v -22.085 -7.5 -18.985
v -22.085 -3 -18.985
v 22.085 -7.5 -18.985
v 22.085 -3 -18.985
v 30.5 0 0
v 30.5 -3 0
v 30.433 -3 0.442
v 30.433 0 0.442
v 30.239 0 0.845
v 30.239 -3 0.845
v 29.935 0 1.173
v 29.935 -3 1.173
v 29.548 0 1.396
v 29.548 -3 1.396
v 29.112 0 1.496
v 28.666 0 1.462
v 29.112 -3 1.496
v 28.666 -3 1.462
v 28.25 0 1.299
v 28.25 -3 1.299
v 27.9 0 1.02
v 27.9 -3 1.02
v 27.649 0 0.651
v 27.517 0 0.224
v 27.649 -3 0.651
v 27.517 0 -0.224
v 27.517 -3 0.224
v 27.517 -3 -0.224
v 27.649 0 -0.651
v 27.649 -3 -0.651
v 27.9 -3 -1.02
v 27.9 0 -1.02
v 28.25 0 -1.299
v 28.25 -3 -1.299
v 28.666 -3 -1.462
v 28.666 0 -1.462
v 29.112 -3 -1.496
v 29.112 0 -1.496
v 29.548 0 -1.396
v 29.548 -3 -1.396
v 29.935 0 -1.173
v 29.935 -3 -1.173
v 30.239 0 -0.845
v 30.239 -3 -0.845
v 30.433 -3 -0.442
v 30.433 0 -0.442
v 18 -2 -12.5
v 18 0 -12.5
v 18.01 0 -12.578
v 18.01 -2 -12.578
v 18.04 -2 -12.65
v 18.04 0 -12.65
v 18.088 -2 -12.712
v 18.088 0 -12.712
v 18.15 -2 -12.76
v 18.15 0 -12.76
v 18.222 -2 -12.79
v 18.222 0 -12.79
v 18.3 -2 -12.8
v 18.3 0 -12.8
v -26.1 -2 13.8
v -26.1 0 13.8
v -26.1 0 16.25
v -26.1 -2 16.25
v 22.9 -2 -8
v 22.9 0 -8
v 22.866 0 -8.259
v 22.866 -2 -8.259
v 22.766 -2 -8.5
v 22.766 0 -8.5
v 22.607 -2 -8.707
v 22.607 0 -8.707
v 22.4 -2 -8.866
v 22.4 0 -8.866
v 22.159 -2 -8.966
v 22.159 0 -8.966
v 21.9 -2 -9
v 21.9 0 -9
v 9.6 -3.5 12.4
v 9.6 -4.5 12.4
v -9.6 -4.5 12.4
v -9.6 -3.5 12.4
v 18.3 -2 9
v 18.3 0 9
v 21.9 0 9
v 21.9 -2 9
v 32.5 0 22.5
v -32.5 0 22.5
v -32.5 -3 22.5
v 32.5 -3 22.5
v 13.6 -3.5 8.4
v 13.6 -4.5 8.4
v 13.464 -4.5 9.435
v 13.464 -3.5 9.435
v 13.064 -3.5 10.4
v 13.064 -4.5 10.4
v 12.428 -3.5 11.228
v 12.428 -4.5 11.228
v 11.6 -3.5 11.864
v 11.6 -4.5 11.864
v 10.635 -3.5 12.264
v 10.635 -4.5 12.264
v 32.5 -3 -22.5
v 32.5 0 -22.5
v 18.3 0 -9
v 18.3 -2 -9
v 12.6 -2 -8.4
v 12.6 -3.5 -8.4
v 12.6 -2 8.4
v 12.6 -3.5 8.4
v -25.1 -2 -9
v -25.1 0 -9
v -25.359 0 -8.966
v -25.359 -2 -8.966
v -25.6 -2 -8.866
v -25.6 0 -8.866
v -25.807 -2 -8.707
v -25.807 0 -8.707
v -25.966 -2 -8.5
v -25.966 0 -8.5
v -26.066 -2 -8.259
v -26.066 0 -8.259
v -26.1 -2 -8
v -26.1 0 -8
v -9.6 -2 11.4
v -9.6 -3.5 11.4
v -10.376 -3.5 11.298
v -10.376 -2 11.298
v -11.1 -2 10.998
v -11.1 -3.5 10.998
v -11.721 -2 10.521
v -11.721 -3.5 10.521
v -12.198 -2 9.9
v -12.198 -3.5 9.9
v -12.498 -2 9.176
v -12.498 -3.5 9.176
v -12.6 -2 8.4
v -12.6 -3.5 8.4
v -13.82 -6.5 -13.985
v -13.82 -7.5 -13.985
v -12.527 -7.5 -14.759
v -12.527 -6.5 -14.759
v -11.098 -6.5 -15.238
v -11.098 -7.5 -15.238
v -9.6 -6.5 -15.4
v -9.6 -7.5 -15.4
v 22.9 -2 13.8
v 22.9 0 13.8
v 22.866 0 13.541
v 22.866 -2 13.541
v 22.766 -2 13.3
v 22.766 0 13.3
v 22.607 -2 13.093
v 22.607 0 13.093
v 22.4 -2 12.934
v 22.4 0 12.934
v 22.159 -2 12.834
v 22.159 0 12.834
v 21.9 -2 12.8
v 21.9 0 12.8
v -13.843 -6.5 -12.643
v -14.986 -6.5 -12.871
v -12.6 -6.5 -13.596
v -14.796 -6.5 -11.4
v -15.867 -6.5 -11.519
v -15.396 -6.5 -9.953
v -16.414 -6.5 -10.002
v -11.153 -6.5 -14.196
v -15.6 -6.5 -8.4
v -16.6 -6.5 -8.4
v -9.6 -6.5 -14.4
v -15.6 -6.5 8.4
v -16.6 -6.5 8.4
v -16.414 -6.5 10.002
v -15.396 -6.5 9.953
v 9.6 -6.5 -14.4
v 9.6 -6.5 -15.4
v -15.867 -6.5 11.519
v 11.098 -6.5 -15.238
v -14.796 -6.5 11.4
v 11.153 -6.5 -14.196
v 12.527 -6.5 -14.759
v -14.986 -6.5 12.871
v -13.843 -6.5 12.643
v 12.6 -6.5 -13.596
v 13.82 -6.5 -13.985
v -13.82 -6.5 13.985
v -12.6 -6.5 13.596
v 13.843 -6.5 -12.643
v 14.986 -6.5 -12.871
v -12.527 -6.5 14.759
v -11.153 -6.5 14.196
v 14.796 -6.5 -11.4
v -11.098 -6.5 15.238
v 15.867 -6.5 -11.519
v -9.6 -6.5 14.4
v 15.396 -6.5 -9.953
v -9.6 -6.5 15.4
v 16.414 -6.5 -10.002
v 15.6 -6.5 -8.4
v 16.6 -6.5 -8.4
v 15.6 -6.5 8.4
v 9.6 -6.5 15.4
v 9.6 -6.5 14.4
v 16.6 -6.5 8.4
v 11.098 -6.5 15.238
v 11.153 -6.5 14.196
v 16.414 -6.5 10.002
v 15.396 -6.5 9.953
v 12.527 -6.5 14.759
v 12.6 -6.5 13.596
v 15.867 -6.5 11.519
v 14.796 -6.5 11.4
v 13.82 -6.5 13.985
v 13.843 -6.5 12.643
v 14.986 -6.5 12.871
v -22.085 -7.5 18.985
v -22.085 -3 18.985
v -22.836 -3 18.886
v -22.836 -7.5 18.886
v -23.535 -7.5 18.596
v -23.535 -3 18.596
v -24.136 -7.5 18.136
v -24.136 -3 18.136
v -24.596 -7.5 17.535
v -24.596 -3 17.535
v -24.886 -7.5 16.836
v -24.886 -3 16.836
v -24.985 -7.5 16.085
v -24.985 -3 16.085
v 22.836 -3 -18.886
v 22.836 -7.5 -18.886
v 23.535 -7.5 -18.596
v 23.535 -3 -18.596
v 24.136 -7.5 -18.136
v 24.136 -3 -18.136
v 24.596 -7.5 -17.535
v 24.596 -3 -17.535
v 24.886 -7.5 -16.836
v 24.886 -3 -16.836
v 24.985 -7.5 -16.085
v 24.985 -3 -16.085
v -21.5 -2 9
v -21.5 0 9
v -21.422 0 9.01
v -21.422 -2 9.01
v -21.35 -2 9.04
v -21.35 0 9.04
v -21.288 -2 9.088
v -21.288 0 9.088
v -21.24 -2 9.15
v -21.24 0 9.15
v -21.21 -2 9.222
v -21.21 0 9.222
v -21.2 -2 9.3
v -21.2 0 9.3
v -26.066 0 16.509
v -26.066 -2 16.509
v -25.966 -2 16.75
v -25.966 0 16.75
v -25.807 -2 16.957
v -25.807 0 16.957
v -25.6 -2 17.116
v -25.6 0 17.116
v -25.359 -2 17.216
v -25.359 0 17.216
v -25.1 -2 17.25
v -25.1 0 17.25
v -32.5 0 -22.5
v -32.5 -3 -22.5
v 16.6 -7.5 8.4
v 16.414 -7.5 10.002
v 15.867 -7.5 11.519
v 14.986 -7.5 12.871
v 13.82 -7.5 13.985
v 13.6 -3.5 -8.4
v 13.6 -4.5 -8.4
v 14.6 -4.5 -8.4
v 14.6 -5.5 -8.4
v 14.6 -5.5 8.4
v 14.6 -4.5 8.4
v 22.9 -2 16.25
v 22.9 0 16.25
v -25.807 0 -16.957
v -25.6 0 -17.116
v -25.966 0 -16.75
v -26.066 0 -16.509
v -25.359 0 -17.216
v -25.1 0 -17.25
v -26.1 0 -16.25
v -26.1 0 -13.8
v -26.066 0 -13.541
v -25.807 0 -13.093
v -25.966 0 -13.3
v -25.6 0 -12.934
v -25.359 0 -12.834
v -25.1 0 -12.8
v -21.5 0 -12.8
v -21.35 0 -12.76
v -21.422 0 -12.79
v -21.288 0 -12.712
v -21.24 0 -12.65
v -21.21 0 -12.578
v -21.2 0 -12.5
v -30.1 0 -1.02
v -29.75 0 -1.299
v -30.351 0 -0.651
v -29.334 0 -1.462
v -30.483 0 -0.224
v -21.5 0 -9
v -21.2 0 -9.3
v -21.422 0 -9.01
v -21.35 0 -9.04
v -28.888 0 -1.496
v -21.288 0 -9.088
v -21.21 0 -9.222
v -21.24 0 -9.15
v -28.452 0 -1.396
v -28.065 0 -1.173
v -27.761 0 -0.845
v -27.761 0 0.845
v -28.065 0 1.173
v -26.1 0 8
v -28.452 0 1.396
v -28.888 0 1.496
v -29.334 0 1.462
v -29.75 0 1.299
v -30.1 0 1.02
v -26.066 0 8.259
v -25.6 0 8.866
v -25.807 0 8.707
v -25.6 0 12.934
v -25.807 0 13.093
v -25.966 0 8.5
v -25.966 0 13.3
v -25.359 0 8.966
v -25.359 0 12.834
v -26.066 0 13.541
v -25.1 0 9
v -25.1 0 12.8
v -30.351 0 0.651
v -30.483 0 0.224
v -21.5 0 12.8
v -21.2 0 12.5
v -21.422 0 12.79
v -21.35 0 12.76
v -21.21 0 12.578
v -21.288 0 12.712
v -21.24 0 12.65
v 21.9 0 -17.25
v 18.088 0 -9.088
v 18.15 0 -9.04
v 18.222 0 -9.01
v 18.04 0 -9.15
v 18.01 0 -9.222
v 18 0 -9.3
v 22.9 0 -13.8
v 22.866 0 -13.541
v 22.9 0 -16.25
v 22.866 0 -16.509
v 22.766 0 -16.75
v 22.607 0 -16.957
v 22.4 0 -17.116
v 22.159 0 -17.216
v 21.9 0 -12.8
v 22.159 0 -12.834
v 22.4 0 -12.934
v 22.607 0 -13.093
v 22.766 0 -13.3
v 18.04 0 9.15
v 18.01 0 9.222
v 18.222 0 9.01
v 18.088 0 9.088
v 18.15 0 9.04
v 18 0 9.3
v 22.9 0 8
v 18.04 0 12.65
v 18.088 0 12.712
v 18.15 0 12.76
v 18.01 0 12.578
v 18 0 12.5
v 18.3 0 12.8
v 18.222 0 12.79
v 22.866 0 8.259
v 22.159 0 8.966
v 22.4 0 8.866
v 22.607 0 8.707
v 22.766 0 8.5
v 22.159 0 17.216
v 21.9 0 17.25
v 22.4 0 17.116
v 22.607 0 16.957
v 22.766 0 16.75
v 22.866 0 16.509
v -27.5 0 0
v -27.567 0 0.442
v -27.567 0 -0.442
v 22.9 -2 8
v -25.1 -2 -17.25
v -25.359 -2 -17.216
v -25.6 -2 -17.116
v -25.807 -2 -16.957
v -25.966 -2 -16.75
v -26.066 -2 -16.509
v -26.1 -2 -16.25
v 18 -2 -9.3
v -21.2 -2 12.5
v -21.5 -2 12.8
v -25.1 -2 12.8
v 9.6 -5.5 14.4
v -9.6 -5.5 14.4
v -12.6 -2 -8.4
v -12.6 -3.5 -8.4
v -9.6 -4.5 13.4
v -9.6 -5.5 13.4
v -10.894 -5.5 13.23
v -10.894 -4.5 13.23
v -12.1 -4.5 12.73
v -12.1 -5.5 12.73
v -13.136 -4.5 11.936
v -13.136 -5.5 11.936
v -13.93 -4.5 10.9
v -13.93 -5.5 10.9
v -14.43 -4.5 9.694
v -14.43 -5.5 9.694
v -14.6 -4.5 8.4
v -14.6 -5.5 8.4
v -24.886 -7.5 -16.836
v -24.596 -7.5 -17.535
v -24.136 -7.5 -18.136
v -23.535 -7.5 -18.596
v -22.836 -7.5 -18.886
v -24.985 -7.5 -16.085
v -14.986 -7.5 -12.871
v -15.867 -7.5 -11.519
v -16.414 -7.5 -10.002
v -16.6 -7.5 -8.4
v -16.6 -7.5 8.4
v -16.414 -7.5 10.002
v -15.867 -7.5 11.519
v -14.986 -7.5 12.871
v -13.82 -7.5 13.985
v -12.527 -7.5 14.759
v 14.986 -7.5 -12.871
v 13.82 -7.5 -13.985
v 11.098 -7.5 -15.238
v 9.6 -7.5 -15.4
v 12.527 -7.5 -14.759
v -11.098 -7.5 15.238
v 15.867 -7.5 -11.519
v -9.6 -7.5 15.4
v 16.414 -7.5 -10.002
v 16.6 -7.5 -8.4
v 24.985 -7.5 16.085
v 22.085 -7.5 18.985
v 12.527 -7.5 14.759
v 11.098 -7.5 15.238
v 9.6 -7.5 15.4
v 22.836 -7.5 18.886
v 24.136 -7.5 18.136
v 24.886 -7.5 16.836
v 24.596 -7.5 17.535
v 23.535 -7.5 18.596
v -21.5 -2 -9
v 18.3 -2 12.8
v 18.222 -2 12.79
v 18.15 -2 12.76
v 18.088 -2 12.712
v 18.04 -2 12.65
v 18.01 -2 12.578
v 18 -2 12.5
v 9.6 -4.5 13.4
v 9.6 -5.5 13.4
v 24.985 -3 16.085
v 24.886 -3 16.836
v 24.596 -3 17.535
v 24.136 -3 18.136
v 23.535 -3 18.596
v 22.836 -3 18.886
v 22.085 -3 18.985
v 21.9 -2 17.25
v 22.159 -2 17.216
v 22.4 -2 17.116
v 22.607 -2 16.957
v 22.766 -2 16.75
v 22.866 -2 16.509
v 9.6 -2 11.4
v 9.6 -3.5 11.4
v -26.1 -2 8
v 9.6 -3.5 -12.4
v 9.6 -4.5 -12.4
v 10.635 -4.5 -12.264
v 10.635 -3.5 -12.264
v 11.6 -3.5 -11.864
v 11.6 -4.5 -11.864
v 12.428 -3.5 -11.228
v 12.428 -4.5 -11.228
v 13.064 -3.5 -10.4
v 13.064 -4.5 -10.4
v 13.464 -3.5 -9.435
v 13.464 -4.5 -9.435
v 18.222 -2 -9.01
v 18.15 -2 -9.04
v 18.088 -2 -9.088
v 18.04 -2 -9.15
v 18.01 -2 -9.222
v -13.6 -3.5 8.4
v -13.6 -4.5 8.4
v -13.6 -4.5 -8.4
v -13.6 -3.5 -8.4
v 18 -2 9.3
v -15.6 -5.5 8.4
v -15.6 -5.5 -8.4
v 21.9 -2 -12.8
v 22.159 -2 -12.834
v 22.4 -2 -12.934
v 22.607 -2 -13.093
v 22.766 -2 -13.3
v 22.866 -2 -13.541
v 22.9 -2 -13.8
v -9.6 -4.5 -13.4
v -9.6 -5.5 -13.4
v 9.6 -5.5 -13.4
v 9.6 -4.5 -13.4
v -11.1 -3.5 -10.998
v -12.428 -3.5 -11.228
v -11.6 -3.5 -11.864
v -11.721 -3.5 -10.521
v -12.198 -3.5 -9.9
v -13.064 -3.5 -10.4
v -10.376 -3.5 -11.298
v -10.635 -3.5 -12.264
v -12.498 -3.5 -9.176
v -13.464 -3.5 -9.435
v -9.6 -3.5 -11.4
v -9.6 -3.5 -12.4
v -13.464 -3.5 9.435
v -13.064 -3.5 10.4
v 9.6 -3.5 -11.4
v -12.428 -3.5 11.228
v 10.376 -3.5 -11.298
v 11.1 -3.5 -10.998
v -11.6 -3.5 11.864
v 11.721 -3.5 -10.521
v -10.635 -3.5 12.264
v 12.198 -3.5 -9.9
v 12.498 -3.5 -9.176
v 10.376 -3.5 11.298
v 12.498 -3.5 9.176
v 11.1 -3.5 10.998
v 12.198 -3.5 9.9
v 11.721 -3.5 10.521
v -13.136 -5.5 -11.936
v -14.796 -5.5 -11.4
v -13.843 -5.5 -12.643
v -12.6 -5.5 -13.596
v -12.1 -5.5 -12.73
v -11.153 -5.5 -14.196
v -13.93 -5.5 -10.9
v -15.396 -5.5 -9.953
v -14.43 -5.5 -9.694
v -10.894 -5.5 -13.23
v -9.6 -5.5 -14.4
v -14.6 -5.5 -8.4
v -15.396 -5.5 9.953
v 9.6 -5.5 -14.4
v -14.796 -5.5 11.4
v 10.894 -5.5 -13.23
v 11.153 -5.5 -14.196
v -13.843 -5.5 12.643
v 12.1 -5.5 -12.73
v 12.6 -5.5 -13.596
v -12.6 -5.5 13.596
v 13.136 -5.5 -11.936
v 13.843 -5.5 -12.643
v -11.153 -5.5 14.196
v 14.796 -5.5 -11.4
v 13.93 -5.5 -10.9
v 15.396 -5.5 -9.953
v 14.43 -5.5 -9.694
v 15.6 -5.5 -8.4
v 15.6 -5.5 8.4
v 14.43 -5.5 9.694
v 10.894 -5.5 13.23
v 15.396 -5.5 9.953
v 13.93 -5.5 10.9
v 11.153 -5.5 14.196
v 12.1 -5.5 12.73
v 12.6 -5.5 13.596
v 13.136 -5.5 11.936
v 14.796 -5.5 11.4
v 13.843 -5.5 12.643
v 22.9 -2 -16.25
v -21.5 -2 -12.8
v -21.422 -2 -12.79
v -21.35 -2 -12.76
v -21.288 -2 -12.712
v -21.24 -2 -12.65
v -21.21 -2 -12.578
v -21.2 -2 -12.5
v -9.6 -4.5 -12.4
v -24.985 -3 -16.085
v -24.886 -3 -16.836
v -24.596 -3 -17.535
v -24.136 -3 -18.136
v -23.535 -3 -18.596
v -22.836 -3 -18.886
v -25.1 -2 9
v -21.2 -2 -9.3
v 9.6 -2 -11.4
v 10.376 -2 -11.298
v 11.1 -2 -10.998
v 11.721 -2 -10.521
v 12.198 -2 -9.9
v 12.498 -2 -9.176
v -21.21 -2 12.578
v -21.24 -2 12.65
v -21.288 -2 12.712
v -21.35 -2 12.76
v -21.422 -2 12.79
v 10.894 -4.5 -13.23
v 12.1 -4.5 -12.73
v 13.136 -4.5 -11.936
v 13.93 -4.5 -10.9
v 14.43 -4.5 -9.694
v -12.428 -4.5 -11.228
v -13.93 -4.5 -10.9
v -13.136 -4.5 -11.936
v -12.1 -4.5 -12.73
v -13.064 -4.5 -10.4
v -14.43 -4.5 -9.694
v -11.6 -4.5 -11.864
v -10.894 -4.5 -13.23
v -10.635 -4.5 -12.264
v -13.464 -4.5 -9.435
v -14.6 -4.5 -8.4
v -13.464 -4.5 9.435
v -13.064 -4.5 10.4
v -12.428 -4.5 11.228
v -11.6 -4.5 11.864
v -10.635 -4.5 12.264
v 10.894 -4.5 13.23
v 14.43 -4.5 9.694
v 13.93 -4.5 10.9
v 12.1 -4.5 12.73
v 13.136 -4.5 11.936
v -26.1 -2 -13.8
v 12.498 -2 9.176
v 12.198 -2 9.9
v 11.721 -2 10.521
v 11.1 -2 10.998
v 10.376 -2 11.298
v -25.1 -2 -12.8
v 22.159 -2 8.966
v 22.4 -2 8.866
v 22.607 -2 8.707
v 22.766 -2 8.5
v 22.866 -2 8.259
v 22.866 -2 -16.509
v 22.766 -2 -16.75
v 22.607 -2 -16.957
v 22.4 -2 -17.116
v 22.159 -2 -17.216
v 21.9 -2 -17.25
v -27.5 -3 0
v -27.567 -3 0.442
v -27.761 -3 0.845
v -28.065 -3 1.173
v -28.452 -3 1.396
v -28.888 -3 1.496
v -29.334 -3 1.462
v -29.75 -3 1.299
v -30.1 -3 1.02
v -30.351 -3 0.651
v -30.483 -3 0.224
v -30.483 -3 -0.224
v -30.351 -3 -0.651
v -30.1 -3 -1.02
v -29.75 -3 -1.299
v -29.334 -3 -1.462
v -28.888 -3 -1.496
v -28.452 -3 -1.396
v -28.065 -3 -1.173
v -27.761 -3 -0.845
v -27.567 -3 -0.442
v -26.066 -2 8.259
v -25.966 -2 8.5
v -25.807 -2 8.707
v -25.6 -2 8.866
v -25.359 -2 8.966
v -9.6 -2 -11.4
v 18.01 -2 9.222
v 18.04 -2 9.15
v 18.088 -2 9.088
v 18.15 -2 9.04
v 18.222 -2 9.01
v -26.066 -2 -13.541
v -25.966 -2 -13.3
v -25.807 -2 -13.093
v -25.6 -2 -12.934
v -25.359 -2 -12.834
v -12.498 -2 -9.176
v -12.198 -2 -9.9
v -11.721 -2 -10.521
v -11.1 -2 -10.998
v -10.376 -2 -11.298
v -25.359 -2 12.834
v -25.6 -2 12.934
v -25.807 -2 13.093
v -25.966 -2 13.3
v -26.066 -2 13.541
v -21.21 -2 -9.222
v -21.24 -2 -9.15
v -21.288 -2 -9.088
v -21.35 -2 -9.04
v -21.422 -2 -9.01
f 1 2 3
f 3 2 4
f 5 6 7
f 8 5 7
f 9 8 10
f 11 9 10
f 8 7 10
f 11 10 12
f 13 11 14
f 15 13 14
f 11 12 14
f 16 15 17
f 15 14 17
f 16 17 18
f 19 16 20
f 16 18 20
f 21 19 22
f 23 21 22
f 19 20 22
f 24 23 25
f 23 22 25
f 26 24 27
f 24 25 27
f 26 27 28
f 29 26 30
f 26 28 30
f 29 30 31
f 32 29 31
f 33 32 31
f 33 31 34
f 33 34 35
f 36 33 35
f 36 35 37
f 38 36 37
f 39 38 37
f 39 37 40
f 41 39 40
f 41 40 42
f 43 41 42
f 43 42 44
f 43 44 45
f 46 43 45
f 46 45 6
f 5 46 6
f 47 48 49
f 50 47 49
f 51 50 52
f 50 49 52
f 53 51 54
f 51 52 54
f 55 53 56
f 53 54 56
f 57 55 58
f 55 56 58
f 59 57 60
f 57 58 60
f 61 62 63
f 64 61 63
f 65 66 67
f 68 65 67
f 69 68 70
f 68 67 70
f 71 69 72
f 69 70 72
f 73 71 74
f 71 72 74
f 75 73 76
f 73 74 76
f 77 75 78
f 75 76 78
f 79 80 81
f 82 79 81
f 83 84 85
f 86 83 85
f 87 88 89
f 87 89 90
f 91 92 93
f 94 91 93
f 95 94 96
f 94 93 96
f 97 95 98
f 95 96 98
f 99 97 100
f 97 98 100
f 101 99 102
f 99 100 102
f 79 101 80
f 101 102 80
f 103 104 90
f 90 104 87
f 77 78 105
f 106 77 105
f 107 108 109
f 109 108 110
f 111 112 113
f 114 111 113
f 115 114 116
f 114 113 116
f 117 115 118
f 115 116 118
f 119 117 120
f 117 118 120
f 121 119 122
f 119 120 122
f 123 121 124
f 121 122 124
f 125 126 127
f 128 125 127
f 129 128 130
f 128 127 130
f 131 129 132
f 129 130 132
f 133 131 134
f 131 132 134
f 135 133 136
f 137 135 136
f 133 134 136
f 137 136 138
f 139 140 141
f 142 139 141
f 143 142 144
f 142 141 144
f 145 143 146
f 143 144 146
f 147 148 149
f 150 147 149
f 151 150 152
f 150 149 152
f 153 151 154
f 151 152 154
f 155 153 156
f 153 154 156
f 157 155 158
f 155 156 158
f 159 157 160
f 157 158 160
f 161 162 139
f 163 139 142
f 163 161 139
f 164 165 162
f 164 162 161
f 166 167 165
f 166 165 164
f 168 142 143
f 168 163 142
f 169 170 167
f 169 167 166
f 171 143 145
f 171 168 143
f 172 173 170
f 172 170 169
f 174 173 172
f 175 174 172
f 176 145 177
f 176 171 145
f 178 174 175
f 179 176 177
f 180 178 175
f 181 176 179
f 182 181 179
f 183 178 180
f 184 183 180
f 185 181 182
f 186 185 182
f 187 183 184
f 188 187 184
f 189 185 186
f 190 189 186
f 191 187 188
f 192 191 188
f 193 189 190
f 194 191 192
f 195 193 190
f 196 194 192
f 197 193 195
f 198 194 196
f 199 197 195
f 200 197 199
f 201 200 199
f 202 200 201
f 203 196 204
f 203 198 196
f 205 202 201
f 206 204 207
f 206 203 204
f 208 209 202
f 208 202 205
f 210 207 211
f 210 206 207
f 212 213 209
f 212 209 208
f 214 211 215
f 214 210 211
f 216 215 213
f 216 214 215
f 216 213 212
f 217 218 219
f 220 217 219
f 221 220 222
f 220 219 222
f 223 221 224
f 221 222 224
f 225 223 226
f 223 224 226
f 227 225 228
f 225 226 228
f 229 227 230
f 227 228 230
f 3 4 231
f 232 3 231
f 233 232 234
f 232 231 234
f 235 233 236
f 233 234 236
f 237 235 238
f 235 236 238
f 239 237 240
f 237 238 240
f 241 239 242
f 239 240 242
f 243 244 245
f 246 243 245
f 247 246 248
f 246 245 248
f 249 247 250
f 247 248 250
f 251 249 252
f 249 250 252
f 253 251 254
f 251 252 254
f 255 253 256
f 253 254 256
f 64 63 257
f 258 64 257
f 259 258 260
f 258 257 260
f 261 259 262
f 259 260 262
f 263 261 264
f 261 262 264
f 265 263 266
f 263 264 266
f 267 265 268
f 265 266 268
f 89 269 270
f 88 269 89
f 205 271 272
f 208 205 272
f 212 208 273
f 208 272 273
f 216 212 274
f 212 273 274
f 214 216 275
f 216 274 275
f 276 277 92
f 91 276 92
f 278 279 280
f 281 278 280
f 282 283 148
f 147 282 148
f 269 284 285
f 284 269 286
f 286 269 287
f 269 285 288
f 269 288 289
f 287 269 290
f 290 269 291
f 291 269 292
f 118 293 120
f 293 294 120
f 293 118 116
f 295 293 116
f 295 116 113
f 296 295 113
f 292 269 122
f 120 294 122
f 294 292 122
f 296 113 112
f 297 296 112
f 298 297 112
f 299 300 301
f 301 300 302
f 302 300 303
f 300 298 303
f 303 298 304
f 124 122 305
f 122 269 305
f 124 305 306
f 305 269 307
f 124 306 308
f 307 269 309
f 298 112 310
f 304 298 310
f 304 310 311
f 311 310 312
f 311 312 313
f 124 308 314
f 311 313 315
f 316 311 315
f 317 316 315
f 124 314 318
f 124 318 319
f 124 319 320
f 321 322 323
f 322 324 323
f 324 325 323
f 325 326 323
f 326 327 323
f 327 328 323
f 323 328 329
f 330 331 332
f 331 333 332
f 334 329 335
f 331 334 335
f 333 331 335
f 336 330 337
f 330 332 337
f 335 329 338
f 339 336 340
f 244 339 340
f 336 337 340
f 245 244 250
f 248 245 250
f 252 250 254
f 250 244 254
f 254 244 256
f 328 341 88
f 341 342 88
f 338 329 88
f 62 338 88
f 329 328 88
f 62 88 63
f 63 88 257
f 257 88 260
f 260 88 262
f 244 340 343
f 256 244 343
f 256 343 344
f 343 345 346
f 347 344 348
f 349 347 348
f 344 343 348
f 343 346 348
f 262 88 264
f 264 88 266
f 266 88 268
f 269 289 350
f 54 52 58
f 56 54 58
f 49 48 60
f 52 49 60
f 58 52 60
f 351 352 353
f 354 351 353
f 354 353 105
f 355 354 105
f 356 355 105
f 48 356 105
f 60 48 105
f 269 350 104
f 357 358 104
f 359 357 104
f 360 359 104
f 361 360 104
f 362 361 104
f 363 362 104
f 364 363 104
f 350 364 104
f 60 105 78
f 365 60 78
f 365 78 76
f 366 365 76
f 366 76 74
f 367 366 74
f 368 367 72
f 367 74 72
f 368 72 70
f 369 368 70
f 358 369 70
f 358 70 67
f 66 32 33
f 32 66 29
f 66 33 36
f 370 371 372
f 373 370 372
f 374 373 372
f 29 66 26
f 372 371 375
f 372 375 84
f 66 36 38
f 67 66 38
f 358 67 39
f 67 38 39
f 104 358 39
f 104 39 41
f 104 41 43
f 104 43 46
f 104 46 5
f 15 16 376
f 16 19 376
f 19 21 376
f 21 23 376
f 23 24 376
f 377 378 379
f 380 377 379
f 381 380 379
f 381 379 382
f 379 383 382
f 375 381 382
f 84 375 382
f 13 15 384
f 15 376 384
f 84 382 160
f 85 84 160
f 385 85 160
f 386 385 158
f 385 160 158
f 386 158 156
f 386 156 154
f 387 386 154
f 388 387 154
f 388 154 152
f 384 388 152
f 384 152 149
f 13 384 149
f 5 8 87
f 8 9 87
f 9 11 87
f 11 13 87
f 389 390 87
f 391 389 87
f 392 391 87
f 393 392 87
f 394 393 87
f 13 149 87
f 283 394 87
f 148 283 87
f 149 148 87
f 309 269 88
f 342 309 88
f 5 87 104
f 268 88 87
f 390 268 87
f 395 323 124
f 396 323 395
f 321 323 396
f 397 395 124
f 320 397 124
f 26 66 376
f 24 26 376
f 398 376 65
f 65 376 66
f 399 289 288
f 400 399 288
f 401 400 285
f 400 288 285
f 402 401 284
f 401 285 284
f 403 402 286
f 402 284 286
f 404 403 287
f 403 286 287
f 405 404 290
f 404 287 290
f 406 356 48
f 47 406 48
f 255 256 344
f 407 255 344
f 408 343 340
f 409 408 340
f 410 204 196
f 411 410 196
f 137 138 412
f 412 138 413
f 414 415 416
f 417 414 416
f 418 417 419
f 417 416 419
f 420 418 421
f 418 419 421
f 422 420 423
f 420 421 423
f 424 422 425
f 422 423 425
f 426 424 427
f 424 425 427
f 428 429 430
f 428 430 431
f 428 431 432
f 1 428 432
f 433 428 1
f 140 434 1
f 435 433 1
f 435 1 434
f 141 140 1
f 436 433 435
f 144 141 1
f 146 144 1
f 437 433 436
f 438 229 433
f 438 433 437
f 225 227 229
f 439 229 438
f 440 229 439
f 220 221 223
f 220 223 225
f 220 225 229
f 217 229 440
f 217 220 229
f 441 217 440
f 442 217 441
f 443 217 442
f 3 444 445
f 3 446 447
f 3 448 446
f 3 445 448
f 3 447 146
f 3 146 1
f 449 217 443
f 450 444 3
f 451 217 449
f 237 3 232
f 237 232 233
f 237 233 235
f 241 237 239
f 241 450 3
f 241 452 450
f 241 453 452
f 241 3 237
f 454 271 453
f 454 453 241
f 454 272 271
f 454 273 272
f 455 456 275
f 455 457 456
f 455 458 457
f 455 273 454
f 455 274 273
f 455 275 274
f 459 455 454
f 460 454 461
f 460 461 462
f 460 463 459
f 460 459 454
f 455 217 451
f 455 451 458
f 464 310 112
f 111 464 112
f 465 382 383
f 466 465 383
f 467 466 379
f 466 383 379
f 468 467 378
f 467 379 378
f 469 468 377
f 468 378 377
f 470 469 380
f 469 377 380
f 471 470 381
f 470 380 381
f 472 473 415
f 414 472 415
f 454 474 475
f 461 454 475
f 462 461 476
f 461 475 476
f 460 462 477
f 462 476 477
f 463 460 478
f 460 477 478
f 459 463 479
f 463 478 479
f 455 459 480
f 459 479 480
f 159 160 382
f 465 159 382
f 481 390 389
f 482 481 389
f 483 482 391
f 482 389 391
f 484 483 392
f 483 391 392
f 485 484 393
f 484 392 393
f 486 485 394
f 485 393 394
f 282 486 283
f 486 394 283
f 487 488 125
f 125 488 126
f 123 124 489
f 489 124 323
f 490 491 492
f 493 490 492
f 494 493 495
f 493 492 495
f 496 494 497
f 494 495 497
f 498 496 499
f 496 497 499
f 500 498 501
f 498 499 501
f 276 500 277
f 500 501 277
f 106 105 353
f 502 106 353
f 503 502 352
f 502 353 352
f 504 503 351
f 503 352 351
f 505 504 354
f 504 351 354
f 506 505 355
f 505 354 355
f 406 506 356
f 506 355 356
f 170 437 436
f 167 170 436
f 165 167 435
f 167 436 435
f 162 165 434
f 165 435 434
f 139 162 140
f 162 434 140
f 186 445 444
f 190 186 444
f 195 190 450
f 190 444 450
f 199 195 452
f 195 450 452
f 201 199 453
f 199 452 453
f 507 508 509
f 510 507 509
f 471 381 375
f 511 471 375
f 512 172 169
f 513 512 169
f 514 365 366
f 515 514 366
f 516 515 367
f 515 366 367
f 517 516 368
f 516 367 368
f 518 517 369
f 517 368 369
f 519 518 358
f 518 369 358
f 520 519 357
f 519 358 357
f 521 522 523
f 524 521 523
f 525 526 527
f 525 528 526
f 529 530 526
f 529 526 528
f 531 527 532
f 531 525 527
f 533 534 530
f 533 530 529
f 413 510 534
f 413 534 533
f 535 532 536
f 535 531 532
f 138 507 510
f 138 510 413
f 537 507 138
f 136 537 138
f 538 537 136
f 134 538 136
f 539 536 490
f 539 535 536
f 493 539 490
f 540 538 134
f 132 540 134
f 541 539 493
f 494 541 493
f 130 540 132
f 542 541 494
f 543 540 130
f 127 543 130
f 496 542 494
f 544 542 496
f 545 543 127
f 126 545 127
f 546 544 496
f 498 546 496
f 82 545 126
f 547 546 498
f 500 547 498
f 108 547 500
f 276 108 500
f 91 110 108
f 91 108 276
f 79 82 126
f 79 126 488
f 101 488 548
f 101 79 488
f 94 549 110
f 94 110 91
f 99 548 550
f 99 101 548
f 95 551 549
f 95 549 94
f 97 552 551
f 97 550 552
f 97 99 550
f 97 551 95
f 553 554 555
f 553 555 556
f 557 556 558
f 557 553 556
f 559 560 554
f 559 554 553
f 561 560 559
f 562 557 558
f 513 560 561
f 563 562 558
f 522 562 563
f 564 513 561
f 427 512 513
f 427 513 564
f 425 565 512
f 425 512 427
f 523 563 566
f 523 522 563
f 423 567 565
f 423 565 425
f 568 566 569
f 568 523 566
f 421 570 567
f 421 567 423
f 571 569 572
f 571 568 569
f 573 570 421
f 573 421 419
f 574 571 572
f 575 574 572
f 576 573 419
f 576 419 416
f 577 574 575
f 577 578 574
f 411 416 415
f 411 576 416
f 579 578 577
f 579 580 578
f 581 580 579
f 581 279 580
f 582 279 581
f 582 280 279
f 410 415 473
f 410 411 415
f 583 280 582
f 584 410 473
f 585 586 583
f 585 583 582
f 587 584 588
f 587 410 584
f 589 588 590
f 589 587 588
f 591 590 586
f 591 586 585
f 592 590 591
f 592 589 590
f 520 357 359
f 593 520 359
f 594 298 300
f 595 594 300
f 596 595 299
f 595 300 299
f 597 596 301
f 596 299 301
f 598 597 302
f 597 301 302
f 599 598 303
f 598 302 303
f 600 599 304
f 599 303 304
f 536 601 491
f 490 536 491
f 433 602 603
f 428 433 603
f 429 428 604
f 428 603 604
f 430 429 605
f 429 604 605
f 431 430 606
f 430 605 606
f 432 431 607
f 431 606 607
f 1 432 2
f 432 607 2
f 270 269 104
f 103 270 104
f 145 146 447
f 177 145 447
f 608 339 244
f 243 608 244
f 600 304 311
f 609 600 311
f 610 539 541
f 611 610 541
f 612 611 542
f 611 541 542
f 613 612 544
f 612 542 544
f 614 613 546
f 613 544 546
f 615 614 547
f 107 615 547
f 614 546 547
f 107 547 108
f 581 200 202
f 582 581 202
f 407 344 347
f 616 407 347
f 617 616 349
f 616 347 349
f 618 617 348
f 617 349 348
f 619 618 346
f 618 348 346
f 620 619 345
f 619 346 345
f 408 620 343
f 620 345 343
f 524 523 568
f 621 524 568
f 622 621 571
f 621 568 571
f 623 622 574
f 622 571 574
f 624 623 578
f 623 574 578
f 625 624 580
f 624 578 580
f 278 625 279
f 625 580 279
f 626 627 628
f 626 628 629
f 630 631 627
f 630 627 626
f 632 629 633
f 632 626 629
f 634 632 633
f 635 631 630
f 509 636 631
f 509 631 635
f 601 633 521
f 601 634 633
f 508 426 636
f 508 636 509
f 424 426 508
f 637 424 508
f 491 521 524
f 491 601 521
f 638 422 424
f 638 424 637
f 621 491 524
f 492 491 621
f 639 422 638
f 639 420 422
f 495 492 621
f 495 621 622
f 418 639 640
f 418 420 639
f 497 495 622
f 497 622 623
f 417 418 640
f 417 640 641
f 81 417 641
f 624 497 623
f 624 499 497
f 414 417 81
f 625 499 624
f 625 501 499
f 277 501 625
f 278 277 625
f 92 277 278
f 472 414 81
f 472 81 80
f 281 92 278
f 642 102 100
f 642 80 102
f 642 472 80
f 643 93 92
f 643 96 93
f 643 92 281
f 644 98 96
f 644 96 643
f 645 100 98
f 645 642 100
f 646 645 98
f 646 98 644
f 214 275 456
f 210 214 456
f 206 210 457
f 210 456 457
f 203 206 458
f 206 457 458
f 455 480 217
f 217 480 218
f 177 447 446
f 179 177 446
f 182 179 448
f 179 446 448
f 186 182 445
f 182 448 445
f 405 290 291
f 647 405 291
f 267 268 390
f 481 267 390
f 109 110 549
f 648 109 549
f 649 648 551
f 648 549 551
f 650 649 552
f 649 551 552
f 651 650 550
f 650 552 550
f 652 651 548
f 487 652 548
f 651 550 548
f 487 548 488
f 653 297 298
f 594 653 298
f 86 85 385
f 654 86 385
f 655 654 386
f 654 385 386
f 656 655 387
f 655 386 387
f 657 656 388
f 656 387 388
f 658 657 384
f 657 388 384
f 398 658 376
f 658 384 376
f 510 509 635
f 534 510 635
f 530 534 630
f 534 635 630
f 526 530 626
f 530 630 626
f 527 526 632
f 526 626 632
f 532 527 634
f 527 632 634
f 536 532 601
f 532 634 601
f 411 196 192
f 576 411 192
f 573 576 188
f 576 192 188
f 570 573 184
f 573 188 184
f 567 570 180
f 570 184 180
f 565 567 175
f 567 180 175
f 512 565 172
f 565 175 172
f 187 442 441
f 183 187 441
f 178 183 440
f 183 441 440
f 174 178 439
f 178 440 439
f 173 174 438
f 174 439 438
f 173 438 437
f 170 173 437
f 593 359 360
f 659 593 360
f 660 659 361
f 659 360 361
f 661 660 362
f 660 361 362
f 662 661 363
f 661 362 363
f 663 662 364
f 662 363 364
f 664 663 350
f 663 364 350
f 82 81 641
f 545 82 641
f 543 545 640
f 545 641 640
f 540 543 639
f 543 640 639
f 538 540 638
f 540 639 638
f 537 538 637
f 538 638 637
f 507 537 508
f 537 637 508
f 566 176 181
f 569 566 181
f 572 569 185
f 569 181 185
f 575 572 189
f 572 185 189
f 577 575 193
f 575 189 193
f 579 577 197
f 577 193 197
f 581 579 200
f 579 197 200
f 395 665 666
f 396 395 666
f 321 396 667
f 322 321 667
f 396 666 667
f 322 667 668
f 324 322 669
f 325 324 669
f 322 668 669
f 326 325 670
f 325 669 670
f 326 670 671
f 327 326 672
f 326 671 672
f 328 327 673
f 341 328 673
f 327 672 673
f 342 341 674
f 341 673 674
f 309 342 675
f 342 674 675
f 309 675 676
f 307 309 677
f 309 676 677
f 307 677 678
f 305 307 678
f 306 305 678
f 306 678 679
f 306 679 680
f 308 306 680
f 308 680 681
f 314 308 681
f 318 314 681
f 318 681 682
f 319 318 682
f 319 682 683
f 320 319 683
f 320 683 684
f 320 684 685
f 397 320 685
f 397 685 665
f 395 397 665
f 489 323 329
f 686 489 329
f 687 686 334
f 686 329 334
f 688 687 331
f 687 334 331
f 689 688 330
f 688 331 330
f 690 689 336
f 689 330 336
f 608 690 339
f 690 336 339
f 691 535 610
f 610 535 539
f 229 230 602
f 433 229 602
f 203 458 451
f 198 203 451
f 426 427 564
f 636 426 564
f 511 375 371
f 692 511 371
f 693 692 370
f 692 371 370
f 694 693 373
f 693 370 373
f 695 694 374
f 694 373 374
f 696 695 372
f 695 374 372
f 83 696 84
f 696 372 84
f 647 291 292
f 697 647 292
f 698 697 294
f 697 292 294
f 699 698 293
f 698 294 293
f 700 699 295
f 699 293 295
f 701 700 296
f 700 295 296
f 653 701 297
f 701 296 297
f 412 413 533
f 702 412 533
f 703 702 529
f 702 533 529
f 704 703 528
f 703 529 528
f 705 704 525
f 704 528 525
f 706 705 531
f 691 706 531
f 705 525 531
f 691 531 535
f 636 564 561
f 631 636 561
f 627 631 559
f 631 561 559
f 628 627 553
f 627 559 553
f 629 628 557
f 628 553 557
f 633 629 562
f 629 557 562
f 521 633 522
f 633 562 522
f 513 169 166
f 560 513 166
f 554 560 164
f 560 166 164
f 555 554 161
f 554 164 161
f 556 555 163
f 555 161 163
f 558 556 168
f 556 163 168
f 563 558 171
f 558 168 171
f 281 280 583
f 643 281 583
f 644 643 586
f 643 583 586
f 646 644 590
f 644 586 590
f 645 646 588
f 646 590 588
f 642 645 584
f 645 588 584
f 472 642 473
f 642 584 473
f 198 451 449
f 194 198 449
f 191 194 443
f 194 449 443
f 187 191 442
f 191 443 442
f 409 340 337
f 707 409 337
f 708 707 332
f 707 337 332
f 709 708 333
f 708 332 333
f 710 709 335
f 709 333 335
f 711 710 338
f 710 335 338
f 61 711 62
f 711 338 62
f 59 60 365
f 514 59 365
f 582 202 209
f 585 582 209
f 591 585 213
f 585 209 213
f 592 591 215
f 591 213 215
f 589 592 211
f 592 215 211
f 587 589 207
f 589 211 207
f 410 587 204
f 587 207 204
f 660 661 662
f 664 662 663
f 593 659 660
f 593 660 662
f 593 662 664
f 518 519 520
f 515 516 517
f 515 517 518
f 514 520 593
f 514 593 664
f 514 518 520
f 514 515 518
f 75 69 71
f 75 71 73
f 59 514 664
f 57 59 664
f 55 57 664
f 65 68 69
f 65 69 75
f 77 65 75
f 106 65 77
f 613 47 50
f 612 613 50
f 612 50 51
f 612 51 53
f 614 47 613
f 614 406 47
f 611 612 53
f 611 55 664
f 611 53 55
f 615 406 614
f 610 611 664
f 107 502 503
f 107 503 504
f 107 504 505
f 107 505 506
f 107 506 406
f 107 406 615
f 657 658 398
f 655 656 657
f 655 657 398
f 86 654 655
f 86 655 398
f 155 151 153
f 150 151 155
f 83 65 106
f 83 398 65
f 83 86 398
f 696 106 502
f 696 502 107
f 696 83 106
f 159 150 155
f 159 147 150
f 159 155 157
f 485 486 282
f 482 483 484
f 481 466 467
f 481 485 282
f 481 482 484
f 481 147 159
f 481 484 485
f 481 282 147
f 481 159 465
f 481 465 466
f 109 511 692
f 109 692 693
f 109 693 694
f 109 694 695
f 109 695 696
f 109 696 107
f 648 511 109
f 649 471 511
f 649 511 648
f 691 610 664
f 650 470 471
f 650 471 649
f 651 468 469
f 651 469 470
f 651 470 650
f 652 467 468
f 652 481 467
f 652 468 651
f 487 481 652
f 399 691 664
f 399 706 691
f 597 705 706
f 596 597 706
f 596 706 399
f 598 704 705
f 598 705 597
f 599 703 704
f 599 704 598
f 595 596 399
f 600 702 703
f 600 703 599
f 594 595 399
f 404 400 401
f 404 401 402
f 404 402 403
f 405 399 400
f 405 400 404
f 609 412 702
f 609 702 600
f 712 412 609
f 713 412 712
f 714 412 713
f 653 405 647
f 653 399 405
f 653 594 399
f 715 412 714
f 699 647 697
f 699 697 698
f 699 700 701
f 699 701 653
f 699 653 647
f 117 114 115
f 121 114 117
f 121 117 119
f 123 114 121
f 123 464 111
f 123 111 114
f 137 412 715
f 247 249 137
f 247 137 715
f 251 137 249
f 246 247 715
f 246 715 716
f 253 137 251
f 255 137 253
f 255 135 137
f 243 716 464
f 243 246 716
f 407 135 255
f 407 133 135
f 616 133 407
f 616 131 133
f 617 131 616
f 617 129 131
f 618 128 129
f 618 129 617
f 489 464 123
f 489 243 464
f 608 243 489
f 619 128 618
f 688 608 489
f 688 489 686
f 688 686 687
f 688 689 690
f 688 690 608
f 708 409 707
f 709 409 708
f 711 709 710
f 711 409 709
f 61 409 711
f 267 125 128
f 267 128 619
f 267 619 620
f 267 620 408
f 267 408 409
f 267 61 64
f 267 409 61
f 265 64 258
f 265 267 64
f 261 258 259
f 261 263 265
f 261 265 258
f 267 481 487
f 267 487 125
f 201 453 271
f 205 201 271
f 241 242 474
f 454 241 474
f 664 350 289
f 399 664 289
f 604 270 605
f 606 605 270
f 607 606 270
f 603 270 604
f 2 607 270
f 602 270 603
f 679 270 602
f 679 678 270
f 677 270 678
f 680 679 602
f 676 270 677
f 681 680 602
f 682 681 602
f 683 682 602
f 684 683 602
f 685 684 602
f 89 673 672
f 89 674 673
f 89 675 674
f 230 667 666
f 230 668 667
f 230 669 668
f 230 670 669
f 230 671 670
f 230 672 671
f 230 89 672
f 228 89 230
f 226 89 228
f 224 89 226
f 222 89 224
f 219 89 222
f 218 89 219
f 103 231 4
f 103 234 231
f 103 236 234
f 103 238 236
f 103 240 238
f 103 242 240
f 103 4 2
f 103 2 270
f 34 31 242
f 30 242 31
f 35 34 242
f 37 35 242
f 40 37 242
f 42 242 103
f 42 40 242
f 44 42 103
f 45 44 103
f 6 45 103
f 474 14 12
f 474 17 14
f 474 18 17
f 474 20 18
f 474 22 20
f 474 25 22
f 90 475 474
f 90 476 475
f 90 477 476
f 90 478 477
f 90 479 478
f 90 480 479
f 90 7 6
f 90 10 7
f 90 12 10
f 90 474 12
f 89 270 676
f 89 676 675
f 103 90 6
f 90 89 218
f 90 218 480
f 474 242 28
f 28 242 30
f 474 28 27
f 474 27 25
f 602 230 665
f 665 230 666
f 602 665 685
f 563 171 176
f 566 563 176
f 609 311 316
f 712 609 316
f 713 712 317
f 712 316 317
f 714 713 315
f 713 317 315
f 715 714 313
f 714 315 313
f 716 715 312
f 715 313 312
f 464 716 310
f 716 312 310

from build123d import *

# Parameters (mm, degrees)
F0_W      = 65
F0_H      = 45
F1_DEPTH  = 3
F3_DEPTH  = 4.5
F4_R      = 1.5
F5_DEPTH  = 25
F7_DEPTH  = 2
F9_DEPTH  = 4
F11_DEPTH = 3
F13_DEPTH = 2
F15_DEPTH = 1


with BuildPart() as f1:
    # F0 (on Front) → F1 (new body)
    with BuildSketch(Plane.XZ):
        Rectangle(F0_W, F0_H)
    extrude(amount=F1_DEPTH)

    # F2 (on face) → F3 (join)
    with BuildSketch(Plane.XZ.offset(3)):
        with BuildLine():
            Line((22.085, 18.985), (-22.085, 18.985))
            ThreePointArc((-22.085, 18.985), (-24.13561, 18.13561), (-24.985, 16.085))
            Line((-24.985, 16.085), (-24.985, -16.085))
            ThreePointArc((-24.985, -16.085), (-24.13561, -18.13561), (-22.085, -18.985))
            Line((-22.085, -18.985), (22.085, -18.985))
            ThreePointArc((22.085, -18.985), (24.13561, -18.13561), (24.985, -16.085))
            Line((24.985, -16.085), (24.985, 16.085))
            ThreePointArc((24.985, 16.085), (24.13561, 18.13561), (22.085, 18.985))
        make_face()
    extrude(amount=F3_DEPTH)

    # F4 (on face) → F5 (cut)
    with BuildSketch(Plane.XZ.offset(7.5)):
        with BuildLine():
            Line((9.6, 11.4), (-9.6, 11.4))
            ThreePointArc((-9.6, 11.4), (-11.72132, 10.52132), (-12.6, 8.4))
            Line((-12.6, 8.4), (-12.6, -8.4))
            ThreePointArc((-12.6, -8.4), (-11.72132, -10.52132), (-9.6, -11.4))
            Line((-9.6, -11.4), (9.6, -11.4))
            ThreePointArc((9.6, -11.4), (11.72132, -10.52132), (12.6, -8.4))
            Line((12.6, -8.4), (12.6, 8.4))
            ThreePointArc((12.6, 8.4), (11.72132, 10.52132), (9.6, 11.4))
        make_face()
        with Locations((-29, 0)):
            Circle(F4_R)
        with Locations((29, 0)):
            Circle(F4_R)
    extrude(amount=-F5_DEPTH, mode=Mode.SUBTRACT)

    # F6 (on face) → F7 (cut)
    with BuildSketch(Plane(origin=(0, 0, 0), x_dir=(-1, 0, 0), z_dir=(0, 1, 0))):
        with BuildLine():
            Line((-18.3, -12.8), (-21.9, -12.8))
            ThreePointArc((-21.9, -12.8), (-22.607107, -13.092893), (-22.9, -13.8))
            Line((-22.9, -13.8), (-22.9, -16.25))
            ThreePointArc((-22.9, -16.25), (-22.607107, -16.957107), (-21.9, -17.25))
            Line((-21.9, -17.25), (25.1, -17.25))
            ThreePointArc((25.1, -17.25), (25.807107, -16.957107), (26.1, -16.25))
            Line((26.1, -16.25), (26.1, -13.8))
            ThreePointArc((26.1, -13.8), (25.807107, -13.092893), (25.1, -12.8))
            Line((25.1, -12.8), (21.5, -12.8))
            ThreePointArc((21.5, -12.8), (21.287868, -12.712132), (21.2, -12.5))
            Line((21.2, -12.5), (21.2, -9.3))
            ThreePointArc((21.2, -9.3), (21.287868, -9.087868), (21.5, -9))
            Line((21.5, -9), (25.1, -9))
            ThreePointArc((25.1, -9), (25.807107, -8.707107), (26.1, -8))
            Line((26.1, -8), (26.1, 8))
            ThreePointArc((26.1, 8), (25.807107, 8.707107), (25.1, 9))
            Line((25.1, 9), (21.5, 9))
            ThreePointArc((21.5, 9), (21.287868, 9.087868), (21.2, 9.3))
            Line((21.2, 9.3), (21.2, 12.5))
            ThreePointArc((21.2, 12.5), (21.287868, 12.712132), (21.5, 12.8))
            Line((21.5, 12.8), (25.1, 12.8))
            ThreePointArc((25.1, 12.8), (25.807107, 13.092893), (26.1, 13.8))
            Line((26.1, 13.8), (26.1, 16.25))
            ThreePointArc((26.1, 16.25), (25.807107, 16.957107), (25.1, 17.25))
            Line((25.1, 17.25), (-21.9, 17.25))
            ThreePointArc((-21.9, 17.25), (-22.607107, 16.957107), (-22.9, 16.25))
            Line((-22.9, 16.25), (-22.9, 13.8))
            ThreePointArc((-22.9, 13.8), (-22.607107, 13.092893), (-21.9, 12.8))
            Line((-21.9, 12.8), (-18.3, 12.8))
            ThreePointArc((-18.3, 12.8), (-18.087868, 12.712132), (-18, 12.5))
            Line((-18, 12.5), (-18, 9.3))
            ThreePointArc((-18, 9.3), (-18.087868, 9.087868), (-18.3, 9))
            Line((-18.3, 9), (-21.9, 9))
            ThreePointArc((-21.9, 9), (-22.607107, 8.707107), (-22.9, 8))
            Line((-22.9, 8), (-22.9, -8))
            ThreePointArc((-22.9, -8), (-22.607107, -8.707107), (-21.9, -9))
            Line((-21.9, -9), (-18.3, -9))
            ThreePointArc((-18.3, -9), (-18.087868, -9.087868), (-18, -9.3))
            Line((-18, -9.3), (-18, -12.5))
            ThreePointArc((-18, -12.5), (-18.087868, -12.712132), (-18.3, -12.8))
        make_face()
    extrude(amount=-F7_DEPTH, mode=Mode.SUBTRACT)

    # F8 (on face) → F9 (cut)
    with BuildSketch(Plane.XZ.offset(7.5)):
        with BuildLine():
            Line((9.6, 12.4), (-9.6, 12.4))
            ThreePointArc((-9.6, 12.4), (-12.428427, 11.228427), (-13.6, 8.4))
            Line((-13.6, 8.4), (-13.6, -8.4))
            ThreePointArc((-13.6, -8.4), (-12.428427, -11.228427), (-9.6, -12.4))
            Line((-9.6, -12.4), (9.6, -12.4))
            ThreePointArc((9.6, -12.4), (12.428427, -11.228427), (13.6, -8.4))
            Line((13.6, -8.4), (13.6, 8.4))
            ThreePointArc((13.6, 8.4), (12.428427, 11.228427), (9.6, 12.4))
        make_face()
    extrude(amount=-F9_DEPTH, mode=Mode.SUBTRACT)

    # F10 (on face) → F11 (cut)
    with BuildSketch(Plane.XZ.offset(7.5)):
        with BuildLine():
            Line((9.6, 13.4), (-9.6, 13.4))
            ThreePointArc((-9.6, 13.4), (-13.135534, 11.935534), (-14.6, 8.4))
            Line((-14.6, 8.4), (-14.6, -8.4))
            ThreePointArc((-14.6, -8.4), (-13.135534, -11.935534), (-9.6, -13.4))
            Line((-9.6, -13.4), (9.6, -13.4))
            ThreePointArc((9.6, -13.4), (13.135534, -11.935534), (14.6, -8.4))
            Line((14.6, -8.4), (14.6, 8.4))
            ThreePointArc((14.6, 8.4), (13.135534, 11.935534), (9.6, 13.4))
        make_face()
    extrude(amount=-F11_DEPTH, mode=Mode.SUBTRACT)

    # F12 (on face) → F13 (cut)
    with BuildSketch(Plane.XZ.offset(7.5)):
        with BuildLine():
            Line((9.6, 14.4), (-9.6, 14.4))
            ThreePointArc((-9.6, 14.4), (-13.842641, 12.642641), (-15.6, 8.4))
            Line((-15.6, 8.4), (-15.6, -8.4))
            ThreePointArc((-15.6, -8.4), (-13.842641, -12.642641), (-9.6, -14.4))
            Line((-9.6, -14.4), (9.6, -14.4))
            ThreePointArc((9.6, -14.4), (13.842641, -12.642641), (15.6, -8.4))
            Line((15.6, -8.4), (15.6, 8.4))
            ThreePointArc((15.6, 8.4), (13.842641, 12.642641), (9.6, 14.4))
        make_face()
    extrude(amount=-F13_DEPTH, mode=Mode.SUBTRACT)

    # F14 (on face) → F15 (cut)
    with BuildSketch(Plane.XZ.offset(7.5)):
        with BuildLine():
            Line((9.6, 15.4), (-9.6, 15.4))
            ThreePointArc((-9.6, 15.4), (-11.825421, 15.036829), (-13.819926, 13.985))
            Line((-13.819926, 13.985), (13.819926, 13.985))
            ThreePointArc((13.819926, 13.985), (11.825421, 15.036829), (9.6, 15.4))
        make_face()
        with BuildLine():
            Line((13.819926, -13.985), (-13.819926, -13.985))
            ThreePointArc((-13.819926, -13.985), (-11.825421, -15.036829), (-9.6, -15.4))
            Line((-9.6, -15.4), (9.6, -15.4))
            ThreePointArc((9.6, -15.4), (11.825421, -15.036829), (13.819926, -13.985))
        make_face()
        with BuildLine():
            Line((13.819926, 13.985), (-13.819926, 13.985))
            ThreePointArc((-13.819926, 13.985), (-15.866557, 11.519336), (-16.6, 8.4))
            Line((-16.6, 8.4), (-16.6, -8.4))
            ThreePointArc((-16.6, -8.4), (-15.866557, -11.519336), (-13.819926, -13.985))
            Line((-13.819926, -13.985), (13.819926, -13.985))
            ThreePointArc((13.819926, -13.985), (15.866557, -11.519336), (16.6, -8.4))
            Line((16.6, -8.4), (16.6, 8.4))
            ThreePointArc((16.6, 8.4), (15.866557, 11.519336), (13.819926, 13.985))
        make_face()
    extrude(amount=-F15_DEPTH, mode=Mode.SUBTRACT)


solid = f1.part
